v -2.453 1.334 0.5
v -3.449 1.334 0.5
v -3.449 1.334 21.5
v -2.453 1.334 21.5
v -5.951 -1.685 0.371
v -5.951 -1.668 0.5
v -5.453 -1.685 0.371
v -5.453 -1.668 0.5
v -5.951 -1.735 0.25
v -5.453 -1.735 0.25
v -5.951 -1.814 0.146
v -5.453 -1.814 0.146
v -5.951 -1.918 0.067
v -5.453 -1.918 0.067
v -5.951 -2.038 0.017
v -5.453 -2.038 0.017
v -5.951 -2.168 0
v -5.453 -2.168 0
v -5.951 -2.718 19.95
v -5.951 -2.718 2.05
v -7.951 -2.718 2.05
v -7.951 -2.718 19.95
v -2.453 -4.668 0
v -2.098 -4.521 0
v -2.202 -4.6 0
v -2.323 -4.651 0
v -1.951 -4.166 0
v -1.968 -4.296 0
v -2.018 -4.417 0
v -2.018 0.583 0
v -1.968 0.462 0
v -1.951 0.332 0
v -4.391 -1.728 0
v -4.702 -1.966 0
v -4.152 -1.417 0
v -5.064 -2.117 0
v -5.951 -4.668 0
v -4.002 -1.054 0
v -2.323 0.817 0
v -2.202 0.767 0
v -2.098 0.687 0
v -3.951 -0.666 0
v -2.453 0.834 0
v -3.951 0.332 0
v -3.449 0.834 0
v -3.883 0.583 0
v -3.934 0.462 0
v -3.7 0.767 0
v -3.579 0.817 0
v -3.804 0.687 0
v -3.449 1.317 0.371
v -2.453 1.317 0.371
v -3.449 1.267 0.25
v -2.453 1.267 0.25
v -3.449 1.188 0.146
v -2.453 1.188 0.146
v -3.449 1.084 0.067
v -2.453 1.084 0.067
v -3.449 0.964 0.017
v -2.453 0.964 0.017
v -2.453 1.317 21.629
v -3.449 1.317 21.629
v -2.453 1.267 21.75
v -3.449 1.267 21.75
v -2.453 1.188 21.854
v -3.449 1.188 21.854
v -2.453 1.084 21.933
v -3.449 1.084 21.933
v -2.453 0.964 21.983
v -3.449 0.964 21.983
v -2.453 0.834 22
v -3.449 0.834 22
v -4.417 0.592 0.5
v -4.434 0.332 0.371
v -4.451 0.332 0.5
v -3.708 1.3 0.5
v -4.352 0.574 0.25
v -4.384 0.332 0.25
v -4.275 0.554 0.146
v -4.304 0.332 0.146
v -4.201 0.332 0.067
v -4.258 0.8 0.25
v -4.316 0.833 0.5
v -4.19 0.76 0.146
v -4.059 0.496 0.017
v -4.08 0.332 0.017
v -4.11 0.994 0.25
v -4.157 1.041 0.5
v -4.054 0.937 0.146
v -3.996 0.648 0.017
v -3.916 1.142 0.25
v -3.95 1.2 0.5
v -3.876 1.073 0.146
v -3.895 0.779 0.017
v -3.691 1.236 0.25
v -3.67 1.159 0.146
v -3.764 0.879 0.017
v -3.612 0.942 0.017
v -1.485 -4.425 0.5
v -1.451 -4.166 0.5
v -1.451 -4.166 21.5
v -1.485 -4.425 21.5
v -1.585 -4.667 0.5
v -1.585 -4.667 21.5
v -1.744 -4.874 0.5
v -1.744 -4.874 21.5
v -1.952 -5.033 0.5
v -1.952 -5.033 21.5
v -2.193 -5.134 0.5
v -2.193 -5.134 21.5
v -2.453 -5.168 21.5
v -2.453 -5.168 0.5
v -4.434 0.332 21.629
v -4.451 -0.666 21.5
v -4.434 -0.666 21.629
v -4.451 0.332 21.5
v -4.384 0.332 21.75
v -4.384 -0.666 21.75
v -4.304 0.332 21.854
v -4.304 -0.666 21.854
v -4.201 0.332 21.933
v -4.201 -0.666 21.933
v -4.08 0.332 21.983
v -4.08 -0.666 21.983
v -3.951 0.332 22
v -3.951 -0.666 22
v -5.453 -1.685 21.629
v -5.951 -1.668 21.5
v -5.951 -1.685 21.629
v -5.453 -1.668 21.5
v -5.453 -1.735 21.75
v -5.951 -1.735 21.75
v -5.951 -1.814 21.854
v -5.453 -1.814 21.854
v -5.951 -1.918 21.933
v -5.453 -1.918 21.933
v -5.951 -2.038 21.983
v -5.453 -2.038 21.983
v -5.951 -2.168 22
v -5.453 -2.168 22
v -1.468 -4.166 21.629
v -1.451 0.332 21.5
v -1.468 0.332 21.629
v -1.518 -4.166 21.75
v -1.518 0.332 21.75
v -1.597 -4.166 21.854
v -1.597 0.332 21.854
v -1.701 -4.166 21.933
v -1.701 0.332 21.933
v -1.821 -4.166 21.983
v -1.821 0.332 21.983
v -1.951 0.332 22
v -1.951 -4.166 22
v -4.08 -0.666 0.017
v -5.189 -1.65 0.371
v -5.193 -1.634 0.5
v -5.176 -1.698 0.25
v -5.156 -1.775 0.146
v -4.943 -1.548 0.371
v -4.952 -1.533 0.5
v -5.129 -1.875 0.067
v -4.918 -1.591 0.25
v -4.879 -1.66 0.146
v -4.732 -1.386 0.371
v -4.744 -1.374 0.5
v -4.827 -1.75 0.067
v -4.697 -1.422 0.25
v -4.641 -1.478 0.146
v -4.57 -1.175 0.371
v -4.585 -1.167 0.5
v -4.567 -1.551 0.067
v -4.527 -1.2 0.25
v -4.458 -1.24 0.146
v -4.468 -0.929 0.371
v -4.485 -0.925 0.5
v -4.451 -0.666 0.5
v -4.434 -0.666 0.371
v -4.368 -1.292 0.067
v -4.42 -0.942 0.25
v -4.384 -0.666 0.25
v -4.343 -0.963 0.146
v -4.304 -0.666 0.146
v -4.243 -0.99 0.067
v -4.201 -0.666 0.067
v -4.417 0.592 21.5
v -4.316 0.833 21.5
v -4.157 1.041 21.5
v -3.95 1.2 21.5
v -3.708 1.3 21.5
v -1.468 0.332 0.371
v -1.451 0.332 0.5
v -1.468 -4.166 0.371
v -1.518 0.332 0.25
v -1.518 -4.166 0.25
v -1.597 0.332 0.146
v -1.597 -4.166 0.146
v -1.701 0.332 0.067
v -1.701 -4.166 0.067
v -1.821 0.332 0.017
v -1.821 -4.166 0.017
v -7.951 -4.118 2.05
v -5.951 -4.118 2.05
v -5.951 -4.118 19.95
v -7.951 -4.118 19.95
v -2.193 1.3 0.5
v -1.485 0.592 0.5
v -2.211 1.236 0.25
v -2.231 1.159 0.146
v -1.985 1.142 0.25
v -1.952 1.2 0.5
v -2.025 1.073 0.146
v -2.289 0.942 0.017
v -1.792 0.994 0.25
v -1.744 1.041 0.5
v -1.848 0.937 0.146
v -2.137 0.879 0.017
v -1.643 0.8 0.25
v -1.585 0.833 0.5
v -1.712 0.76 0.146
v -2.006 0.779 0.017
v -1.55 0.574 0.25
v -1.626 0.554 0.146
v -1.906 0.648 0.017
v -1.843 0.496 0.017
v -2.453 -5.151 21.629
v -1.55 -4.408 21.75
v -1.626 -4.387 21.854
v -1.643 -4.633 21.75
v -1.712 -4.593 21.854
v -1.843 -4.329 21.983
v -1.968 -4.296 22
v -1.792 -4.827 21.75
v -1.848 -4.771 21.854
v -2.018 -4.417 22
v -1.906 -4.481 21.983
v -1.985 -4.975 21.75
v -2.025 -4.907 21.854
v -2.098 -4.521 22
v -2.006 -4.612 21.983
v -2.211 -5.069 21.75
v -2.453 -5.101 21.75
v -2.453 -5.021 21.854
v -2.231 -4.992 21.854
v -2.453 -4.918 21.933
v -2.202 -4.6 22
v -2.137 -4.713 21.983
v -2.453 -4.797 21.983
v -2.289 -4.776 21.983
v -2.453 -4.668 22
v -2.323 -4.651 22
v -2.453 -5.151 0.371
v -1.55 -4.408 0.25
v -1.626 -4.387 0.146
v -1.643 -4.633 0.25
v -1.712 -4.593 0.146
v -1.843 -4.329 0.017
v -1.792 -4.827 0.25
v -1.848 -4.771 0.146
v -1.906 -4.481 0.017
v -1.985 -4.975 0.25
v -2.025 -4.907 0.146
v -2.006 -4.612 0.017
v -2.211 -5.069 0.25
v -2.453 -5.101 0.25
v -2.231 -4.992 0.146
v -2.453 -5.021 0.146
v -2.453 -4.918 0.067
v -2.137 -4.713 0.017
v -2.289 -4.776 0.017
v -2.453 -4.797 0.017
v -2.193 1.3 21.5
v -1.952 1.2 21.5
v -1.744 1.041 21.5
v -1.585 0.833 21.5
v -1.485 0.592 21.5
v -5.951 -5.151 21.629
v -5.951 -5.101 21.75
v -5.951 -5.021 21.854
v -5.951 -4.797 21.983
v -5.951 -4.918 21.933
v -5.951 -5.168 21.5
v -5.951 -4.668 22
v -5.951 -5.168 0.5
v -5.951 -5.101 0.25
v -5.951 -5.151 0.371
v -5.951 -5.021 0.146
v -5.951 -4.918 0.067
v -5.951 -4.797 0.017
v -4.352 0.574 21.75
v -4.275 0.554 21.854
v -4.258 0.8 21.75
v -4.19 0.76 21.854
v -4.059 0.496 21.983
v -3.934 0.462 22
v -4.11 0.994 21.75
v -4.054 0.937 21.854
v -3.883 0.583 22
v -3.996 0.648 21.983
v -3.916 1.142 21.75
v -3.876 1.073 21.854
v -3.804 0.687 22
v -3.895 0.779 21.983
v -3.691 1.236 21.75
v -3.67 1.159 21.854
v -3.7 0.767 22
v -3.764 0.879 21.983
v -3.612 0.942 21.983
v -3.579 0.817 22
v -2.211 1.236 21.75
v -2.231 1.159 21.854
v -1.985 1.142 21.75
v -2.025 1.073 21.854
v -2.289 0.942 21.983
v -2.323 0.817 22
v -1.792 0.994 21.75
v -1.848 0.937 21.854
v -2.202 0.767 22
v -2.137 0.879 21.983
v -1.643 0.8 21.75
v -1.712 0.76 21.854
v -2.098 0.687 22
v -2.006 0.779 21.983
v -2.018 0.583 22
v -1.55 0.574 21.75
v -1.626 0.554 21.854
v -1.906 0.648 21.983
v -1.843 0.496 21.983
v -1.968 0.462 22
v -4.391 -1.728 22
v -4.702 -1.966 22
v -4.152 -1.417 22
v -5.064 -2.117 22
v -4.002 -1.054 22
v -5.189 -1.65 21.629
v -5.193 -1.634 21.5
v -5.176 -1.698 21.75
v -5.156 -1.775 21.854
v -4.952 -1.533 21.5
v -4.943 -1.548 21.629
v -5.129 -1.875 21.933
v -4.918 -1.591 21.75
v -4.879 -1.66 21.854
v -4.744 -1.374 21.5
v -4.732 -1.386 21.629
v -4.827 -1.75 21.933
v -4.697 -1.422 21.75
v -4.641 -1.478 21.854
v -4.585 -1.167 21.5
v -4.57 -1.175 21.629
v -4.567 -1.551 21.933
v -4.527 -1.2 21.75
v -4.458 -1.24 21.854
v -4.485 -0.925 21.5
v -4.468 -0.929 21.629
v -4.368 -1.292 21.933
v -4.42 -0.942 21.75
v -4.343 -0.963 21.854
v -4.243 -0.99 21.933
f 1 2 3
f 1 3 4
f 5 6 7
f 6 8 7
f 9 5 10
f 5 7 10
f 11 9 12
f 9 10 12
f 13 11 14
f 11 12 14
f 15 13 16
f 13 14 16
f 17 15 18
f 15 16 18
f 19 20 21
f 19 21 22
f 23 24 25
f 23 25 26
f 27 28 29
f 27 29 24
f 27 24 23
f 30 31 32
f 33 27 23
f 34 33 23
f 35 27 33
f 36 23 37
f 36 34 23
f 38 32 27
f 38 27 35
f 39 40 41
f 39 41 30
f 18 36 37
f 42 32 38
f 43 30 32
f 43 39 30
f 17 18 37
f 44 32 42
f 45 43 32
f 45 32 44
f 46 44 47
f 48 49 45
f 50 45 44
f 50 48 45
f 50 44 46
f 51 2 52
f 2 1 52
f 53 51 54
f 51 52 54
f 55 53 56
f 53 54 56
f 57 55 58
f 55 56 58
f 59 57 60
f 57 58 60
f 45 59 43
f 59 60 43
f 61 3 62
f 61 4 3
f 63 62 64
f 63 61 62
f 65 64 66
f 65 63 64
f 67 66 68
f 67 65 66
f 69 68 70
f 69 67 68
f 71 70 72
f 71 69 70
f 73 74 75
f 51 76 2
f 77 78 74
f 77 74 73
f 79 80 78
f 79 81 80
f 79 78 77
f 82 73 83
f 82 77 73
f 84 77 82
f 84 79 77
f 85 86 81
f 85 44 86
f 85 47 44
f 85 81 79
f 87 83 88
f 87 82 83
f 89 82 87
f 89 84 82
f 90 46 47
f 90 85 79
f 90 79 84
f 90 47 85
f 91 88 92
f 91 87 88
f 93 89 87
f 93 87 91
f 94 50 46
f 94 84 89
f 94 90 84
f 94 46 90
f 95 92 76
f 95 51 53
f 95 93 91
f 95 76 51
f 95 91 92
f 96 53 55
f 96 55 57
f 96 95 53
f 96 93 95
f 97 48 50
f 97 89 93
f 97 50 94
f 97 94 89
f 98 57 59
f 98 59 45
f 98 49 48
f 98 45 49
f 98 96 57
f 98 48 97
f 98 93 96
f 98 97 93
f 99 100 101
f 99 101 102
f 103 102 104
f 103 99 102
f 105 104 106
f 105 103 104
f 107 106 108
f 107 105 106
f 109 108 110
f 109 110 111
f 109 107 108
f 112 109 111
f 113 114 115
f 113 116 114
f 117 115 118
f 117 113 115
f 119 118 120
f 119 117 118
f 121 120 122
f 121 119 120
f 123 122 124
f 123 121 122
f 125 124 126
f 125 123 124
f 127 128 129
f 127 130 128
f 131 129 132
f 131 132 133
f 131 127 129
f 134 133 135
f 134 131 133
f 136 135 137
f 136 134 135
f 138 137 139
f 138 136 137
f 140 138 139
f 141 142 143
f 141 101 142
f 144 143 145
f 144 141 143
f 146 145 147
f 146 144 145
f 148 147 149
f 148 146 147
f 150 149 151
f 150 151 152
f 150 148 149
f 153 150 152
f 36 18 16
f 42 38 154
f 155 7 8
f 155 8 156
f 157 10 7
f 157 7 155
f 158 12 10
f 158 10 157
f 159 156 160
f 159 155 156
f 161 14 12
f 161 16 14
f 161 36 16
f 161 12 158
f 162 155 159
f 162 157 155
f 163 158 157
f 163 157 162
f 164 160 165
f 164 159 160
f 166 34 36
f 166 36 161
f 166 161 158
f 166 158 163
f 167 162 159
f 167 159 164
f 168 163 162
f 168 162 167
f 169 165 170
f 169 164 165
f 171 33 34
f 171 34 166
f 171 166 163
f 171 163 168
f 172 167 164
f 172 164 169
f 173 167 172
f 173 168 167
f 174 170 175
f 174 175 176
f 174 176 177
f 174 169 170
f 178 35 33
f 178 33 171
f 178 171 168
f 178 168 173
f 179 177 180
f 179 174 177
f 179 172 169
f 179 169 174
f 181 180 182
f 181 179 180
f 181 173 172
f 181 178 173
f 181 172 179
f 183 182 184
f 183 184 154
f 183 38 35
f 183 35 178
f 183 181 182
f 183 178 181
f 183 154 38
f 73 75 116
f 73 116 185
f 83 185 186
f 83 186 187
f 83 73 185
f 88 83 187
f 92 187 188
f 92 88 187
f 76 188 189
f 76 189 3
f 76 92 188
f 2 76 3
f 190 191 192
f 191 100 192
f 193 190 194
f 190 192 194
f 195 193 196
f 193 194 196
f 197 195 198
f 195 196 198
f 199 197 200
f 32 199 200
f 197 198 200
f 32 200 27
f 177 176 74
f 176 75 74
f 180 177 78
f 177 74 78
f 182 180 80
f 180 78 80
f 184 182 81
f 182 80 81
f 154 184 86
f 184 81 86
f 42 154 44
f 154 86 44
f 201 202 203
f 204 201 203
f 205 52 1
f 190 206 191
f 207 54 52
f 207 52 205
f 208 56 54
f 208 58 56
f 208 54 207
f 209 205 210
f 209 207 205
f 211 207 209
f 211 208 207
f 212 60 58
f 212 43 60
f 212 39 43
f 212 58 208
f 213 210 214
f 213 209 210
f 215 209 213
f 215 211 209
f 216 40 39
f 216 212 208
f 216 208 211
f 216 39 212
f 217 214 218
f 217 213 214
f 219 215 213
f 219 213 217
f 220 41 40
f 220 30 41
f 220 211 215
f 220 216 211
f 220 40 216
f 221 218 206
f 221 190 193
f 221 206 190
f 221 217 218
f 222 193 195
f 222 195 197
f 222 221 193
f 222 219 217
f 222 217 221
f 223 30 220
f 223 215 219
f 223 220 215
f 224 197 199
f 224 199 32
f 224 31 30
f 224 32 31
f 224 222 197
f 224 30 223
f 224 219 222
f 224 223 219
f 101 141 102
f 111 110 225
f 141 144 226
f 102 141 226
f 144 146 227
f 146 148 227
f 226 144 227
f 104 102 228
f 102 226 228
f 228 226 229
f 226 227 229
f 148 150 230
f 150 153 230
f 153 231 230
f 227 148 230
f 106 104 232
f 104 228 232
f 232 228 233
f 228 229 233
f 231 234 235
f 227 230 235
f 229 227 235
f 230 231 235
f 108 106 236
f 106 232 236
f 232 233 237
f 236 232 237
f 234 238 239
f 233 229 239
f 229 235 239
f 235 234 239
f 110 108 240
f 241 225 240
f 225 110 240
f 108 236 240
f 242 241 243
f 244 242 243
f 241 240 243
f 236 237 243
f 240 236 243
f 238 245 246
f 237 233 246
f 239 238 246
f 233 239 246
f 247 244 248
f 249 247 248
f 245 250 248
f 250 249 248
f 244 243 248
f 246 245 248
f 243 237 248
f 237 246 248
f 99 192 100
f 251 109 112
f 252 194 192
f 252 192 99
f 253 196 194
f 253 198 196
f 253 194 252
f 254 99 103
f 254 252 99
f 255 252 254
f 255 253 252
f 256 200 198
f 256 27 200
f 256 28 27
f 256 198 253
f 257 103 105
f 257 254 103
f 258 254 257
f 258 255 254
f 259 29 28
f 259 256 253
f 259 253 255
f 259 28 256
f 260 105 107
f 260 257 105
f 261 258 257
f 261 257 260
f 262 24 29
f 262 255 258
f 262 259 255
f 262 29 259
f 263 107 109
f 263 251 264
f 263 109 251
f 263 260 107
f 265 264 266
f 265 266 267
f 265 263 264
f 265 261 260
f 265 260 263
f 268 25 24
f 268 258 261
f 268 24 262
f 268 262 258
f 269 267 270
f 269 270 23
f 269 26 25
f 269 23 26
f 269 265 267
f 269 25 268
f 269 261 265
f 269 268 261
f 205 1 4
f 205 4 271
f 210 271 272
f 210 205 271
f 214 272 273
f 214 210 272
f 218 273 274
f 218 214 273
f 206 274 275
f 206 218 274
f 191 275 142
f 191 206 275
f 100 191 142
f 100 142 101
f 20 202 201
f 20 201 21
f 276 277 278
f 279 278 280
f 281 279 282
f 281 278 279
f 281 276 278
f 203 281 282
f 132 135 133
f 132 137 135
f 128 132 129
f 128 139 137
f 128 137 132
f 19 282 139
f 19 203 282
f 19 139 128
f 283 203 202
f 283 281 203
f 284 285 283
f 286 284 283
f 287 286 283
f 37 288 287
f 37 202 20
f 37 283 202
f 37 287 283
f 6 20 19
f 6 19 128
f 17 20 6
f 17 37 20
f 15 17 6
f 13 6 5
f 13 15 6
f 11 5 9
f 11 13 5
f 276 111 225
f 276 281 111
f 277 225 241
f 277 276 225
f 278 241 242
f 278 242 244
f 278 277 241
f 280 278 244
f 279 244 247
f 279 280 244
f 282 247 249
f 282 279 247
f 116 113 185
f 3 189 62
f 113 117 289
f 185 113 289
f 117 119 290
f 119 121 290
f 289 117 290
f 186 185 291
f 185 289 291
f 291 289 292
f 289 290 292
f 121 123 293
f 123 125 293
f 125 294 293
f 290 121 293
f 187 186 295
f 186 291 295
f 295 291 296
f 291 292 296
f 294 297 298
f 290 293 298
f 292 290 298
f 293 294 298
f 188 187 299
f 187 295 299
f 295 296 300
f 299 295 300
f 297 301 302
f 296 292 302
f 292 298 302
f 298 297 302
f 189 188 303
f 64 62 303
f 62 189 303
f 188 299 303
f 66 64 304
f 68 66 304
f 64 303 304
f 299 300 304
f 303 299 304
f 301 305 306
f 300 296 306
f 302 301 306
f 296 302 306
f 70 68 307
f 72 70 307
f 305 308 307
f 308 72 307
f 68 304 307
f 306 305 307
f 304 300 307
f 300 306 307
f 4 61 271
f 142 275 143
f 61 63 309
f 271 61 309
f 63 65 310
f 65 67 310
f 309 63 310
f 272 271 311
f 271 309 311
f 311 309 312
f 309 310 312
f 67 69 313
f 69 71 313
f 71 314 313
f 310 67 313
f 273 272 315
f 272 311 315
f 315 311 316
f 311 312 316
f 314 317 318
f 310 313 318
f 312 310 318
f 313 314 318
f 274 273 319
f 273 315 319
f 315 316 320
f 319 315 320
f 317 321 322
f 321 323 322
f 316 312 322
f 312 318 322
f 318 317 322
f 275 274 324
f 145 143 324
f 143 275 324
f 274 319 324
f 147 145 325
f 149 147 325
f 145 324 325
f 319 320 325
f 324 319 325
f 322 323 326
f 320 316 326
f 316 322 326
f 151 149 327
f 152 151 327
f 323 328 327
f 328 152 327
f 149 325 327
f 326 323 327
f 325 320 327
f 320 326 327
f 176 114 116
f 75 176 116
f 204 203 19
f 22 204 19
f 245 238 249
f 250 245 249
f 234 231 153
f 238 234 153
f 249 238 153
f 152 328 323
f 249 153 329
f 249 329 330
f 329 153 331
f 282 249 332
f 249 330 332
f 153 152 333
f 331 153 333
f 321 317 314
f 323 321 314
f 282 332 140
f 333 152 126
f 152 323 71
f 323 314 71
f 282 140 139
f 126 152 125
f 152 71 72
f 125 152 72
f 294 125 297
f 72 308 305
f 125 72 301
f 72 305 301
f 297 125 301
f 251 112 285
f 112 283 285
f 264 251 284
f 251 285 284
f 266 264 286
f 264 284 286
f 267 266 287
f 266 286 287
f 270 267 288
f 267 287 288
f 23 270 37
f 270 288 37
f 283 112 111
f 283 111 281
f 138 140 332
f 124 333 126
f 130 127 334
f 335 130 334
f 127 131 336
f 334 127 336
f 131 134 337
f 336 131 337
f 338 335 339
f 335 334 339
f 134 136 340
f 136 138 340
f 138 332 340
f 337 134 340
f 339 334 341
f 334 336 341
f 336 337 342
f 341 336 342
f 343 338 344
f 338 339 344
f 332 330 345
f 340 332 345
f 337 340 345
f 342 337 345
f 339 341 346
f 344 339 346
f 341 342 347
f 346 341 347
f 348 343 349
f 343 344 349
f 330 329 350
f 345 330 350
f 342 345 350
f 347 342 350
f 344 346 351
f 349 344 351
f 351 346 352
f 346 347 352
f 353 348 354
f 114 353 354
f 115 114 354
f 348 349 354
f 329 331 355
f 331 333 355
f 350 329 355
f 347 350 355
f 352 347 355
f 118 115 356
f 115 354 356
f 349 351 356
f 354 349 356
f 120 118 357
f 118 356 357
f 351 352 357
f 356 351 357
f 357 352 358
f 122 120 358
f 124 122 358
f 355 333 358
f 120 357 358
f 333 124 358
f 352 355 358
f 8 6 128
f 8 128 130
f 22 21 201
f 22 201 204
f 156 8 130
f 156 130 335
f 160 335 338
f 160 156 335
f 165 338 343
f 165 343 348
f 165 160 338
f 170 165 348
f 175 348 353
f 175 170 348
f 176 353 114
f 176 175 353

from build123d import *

# Parameters (mm, degrees)
BOSS_EXTRUDE1_DEPTH = 22
FILLET1_R           = 0.5
SKETCH2_W           = 17.9
SKETCH2_H           = 1.4
BOSS_EXTRUDE2_DEPTH = 2


with BuildPart() as part:
    # Sketch1 → Boss-Extrude1 (new body)
    with BuildSketch(Plane.XY):
        with BuildLine():
            Line((-5.950723388, -1.667721547), (-5.452849623, -1.667721547))
            ThreePointArc((-5.452849623, -1.667721547), (-4.744239366, -1.374205568), (-4.450723388, -0.665595311))
            Line((-4.450723388, -0.665595311), (-4.450723388, 0.332278453))
            ThreePointArc((-4.450723388, 0.332278453), (-4.157207409, 1.04088871), (-3.448597153, 1.334404689))
            Line((-3.448597153, 1.334404689), (-2.452849623, 1.334404689))
            ThreePointArc((-2.452849623, 1.334404689), (-1.744239366, 1.04088871), (-1.450723388, 0.332278453))
            Line((-1.450723388, 0.332278453), (-1.450723388, -4.165595311))
            ThreePointArc((-1.450723388, -4.165595311), (-1.744239366, -4.874205568), (-2.452849623, -5.167721547))
            Line((-2.452849623, -5.167721547), (-5.950723388, -5.167721547))
            Line((-5.950723388, -5.167721547), (-5.950723388, -1.667721547))
        make_face()
    extrude(amount=BOSS_EXTRUDE1_DEPTH)

    # Fillet1
    fillet1_edges = [part.edges().sort_by_distance(p)[0] for p in [
        (-1.744239366, 1.04088871, 22),
        (-5.701786505, -1.667721547, 0),
        (-4.744239366, -1.374205568, 0),
        (-4.450723388, -0.166658429, 0),
        (-4.157207409, 1.04088871, 0),
        (-2.950723388, 1.334404689, 0),
        (-1.744239366, 1.04088871, 0),
        (-1.450723388, -1.916658429, 0),
        (-1.744239366, -4.874205568, 0),
        (-2.950723388, 1.334404689, 22),
        (-4.157207409, 1.04088871, 22),
        (-4.450723388, -0.166658429, 22),
        (-4.744239366, -1.374205568, 22),
        (-5.701786505, -1.667721547, 22),
        (-4.201786505, -5.167721547, 22),
        (-1.744239366, -4.874205568, 22),
        (-1.450723388, -1.916658429, 22),
        (-4.201786505, -5.167721547, 0),
    ]]
    fillet(fillet1_edges, radius=FILLET1_R)

    # Sketch2 → Boss-Extrude2 (add)
    with BuildSketch(Plane.ZY.offset(5.950723388)):
        with Locations((11, -3.417721547)):
            Rectangle(SKETCH2_W, SKETCH2_H)
    extrude(amount=BOSS_EXTRUDE2_DEPTH)


solid = part.part
